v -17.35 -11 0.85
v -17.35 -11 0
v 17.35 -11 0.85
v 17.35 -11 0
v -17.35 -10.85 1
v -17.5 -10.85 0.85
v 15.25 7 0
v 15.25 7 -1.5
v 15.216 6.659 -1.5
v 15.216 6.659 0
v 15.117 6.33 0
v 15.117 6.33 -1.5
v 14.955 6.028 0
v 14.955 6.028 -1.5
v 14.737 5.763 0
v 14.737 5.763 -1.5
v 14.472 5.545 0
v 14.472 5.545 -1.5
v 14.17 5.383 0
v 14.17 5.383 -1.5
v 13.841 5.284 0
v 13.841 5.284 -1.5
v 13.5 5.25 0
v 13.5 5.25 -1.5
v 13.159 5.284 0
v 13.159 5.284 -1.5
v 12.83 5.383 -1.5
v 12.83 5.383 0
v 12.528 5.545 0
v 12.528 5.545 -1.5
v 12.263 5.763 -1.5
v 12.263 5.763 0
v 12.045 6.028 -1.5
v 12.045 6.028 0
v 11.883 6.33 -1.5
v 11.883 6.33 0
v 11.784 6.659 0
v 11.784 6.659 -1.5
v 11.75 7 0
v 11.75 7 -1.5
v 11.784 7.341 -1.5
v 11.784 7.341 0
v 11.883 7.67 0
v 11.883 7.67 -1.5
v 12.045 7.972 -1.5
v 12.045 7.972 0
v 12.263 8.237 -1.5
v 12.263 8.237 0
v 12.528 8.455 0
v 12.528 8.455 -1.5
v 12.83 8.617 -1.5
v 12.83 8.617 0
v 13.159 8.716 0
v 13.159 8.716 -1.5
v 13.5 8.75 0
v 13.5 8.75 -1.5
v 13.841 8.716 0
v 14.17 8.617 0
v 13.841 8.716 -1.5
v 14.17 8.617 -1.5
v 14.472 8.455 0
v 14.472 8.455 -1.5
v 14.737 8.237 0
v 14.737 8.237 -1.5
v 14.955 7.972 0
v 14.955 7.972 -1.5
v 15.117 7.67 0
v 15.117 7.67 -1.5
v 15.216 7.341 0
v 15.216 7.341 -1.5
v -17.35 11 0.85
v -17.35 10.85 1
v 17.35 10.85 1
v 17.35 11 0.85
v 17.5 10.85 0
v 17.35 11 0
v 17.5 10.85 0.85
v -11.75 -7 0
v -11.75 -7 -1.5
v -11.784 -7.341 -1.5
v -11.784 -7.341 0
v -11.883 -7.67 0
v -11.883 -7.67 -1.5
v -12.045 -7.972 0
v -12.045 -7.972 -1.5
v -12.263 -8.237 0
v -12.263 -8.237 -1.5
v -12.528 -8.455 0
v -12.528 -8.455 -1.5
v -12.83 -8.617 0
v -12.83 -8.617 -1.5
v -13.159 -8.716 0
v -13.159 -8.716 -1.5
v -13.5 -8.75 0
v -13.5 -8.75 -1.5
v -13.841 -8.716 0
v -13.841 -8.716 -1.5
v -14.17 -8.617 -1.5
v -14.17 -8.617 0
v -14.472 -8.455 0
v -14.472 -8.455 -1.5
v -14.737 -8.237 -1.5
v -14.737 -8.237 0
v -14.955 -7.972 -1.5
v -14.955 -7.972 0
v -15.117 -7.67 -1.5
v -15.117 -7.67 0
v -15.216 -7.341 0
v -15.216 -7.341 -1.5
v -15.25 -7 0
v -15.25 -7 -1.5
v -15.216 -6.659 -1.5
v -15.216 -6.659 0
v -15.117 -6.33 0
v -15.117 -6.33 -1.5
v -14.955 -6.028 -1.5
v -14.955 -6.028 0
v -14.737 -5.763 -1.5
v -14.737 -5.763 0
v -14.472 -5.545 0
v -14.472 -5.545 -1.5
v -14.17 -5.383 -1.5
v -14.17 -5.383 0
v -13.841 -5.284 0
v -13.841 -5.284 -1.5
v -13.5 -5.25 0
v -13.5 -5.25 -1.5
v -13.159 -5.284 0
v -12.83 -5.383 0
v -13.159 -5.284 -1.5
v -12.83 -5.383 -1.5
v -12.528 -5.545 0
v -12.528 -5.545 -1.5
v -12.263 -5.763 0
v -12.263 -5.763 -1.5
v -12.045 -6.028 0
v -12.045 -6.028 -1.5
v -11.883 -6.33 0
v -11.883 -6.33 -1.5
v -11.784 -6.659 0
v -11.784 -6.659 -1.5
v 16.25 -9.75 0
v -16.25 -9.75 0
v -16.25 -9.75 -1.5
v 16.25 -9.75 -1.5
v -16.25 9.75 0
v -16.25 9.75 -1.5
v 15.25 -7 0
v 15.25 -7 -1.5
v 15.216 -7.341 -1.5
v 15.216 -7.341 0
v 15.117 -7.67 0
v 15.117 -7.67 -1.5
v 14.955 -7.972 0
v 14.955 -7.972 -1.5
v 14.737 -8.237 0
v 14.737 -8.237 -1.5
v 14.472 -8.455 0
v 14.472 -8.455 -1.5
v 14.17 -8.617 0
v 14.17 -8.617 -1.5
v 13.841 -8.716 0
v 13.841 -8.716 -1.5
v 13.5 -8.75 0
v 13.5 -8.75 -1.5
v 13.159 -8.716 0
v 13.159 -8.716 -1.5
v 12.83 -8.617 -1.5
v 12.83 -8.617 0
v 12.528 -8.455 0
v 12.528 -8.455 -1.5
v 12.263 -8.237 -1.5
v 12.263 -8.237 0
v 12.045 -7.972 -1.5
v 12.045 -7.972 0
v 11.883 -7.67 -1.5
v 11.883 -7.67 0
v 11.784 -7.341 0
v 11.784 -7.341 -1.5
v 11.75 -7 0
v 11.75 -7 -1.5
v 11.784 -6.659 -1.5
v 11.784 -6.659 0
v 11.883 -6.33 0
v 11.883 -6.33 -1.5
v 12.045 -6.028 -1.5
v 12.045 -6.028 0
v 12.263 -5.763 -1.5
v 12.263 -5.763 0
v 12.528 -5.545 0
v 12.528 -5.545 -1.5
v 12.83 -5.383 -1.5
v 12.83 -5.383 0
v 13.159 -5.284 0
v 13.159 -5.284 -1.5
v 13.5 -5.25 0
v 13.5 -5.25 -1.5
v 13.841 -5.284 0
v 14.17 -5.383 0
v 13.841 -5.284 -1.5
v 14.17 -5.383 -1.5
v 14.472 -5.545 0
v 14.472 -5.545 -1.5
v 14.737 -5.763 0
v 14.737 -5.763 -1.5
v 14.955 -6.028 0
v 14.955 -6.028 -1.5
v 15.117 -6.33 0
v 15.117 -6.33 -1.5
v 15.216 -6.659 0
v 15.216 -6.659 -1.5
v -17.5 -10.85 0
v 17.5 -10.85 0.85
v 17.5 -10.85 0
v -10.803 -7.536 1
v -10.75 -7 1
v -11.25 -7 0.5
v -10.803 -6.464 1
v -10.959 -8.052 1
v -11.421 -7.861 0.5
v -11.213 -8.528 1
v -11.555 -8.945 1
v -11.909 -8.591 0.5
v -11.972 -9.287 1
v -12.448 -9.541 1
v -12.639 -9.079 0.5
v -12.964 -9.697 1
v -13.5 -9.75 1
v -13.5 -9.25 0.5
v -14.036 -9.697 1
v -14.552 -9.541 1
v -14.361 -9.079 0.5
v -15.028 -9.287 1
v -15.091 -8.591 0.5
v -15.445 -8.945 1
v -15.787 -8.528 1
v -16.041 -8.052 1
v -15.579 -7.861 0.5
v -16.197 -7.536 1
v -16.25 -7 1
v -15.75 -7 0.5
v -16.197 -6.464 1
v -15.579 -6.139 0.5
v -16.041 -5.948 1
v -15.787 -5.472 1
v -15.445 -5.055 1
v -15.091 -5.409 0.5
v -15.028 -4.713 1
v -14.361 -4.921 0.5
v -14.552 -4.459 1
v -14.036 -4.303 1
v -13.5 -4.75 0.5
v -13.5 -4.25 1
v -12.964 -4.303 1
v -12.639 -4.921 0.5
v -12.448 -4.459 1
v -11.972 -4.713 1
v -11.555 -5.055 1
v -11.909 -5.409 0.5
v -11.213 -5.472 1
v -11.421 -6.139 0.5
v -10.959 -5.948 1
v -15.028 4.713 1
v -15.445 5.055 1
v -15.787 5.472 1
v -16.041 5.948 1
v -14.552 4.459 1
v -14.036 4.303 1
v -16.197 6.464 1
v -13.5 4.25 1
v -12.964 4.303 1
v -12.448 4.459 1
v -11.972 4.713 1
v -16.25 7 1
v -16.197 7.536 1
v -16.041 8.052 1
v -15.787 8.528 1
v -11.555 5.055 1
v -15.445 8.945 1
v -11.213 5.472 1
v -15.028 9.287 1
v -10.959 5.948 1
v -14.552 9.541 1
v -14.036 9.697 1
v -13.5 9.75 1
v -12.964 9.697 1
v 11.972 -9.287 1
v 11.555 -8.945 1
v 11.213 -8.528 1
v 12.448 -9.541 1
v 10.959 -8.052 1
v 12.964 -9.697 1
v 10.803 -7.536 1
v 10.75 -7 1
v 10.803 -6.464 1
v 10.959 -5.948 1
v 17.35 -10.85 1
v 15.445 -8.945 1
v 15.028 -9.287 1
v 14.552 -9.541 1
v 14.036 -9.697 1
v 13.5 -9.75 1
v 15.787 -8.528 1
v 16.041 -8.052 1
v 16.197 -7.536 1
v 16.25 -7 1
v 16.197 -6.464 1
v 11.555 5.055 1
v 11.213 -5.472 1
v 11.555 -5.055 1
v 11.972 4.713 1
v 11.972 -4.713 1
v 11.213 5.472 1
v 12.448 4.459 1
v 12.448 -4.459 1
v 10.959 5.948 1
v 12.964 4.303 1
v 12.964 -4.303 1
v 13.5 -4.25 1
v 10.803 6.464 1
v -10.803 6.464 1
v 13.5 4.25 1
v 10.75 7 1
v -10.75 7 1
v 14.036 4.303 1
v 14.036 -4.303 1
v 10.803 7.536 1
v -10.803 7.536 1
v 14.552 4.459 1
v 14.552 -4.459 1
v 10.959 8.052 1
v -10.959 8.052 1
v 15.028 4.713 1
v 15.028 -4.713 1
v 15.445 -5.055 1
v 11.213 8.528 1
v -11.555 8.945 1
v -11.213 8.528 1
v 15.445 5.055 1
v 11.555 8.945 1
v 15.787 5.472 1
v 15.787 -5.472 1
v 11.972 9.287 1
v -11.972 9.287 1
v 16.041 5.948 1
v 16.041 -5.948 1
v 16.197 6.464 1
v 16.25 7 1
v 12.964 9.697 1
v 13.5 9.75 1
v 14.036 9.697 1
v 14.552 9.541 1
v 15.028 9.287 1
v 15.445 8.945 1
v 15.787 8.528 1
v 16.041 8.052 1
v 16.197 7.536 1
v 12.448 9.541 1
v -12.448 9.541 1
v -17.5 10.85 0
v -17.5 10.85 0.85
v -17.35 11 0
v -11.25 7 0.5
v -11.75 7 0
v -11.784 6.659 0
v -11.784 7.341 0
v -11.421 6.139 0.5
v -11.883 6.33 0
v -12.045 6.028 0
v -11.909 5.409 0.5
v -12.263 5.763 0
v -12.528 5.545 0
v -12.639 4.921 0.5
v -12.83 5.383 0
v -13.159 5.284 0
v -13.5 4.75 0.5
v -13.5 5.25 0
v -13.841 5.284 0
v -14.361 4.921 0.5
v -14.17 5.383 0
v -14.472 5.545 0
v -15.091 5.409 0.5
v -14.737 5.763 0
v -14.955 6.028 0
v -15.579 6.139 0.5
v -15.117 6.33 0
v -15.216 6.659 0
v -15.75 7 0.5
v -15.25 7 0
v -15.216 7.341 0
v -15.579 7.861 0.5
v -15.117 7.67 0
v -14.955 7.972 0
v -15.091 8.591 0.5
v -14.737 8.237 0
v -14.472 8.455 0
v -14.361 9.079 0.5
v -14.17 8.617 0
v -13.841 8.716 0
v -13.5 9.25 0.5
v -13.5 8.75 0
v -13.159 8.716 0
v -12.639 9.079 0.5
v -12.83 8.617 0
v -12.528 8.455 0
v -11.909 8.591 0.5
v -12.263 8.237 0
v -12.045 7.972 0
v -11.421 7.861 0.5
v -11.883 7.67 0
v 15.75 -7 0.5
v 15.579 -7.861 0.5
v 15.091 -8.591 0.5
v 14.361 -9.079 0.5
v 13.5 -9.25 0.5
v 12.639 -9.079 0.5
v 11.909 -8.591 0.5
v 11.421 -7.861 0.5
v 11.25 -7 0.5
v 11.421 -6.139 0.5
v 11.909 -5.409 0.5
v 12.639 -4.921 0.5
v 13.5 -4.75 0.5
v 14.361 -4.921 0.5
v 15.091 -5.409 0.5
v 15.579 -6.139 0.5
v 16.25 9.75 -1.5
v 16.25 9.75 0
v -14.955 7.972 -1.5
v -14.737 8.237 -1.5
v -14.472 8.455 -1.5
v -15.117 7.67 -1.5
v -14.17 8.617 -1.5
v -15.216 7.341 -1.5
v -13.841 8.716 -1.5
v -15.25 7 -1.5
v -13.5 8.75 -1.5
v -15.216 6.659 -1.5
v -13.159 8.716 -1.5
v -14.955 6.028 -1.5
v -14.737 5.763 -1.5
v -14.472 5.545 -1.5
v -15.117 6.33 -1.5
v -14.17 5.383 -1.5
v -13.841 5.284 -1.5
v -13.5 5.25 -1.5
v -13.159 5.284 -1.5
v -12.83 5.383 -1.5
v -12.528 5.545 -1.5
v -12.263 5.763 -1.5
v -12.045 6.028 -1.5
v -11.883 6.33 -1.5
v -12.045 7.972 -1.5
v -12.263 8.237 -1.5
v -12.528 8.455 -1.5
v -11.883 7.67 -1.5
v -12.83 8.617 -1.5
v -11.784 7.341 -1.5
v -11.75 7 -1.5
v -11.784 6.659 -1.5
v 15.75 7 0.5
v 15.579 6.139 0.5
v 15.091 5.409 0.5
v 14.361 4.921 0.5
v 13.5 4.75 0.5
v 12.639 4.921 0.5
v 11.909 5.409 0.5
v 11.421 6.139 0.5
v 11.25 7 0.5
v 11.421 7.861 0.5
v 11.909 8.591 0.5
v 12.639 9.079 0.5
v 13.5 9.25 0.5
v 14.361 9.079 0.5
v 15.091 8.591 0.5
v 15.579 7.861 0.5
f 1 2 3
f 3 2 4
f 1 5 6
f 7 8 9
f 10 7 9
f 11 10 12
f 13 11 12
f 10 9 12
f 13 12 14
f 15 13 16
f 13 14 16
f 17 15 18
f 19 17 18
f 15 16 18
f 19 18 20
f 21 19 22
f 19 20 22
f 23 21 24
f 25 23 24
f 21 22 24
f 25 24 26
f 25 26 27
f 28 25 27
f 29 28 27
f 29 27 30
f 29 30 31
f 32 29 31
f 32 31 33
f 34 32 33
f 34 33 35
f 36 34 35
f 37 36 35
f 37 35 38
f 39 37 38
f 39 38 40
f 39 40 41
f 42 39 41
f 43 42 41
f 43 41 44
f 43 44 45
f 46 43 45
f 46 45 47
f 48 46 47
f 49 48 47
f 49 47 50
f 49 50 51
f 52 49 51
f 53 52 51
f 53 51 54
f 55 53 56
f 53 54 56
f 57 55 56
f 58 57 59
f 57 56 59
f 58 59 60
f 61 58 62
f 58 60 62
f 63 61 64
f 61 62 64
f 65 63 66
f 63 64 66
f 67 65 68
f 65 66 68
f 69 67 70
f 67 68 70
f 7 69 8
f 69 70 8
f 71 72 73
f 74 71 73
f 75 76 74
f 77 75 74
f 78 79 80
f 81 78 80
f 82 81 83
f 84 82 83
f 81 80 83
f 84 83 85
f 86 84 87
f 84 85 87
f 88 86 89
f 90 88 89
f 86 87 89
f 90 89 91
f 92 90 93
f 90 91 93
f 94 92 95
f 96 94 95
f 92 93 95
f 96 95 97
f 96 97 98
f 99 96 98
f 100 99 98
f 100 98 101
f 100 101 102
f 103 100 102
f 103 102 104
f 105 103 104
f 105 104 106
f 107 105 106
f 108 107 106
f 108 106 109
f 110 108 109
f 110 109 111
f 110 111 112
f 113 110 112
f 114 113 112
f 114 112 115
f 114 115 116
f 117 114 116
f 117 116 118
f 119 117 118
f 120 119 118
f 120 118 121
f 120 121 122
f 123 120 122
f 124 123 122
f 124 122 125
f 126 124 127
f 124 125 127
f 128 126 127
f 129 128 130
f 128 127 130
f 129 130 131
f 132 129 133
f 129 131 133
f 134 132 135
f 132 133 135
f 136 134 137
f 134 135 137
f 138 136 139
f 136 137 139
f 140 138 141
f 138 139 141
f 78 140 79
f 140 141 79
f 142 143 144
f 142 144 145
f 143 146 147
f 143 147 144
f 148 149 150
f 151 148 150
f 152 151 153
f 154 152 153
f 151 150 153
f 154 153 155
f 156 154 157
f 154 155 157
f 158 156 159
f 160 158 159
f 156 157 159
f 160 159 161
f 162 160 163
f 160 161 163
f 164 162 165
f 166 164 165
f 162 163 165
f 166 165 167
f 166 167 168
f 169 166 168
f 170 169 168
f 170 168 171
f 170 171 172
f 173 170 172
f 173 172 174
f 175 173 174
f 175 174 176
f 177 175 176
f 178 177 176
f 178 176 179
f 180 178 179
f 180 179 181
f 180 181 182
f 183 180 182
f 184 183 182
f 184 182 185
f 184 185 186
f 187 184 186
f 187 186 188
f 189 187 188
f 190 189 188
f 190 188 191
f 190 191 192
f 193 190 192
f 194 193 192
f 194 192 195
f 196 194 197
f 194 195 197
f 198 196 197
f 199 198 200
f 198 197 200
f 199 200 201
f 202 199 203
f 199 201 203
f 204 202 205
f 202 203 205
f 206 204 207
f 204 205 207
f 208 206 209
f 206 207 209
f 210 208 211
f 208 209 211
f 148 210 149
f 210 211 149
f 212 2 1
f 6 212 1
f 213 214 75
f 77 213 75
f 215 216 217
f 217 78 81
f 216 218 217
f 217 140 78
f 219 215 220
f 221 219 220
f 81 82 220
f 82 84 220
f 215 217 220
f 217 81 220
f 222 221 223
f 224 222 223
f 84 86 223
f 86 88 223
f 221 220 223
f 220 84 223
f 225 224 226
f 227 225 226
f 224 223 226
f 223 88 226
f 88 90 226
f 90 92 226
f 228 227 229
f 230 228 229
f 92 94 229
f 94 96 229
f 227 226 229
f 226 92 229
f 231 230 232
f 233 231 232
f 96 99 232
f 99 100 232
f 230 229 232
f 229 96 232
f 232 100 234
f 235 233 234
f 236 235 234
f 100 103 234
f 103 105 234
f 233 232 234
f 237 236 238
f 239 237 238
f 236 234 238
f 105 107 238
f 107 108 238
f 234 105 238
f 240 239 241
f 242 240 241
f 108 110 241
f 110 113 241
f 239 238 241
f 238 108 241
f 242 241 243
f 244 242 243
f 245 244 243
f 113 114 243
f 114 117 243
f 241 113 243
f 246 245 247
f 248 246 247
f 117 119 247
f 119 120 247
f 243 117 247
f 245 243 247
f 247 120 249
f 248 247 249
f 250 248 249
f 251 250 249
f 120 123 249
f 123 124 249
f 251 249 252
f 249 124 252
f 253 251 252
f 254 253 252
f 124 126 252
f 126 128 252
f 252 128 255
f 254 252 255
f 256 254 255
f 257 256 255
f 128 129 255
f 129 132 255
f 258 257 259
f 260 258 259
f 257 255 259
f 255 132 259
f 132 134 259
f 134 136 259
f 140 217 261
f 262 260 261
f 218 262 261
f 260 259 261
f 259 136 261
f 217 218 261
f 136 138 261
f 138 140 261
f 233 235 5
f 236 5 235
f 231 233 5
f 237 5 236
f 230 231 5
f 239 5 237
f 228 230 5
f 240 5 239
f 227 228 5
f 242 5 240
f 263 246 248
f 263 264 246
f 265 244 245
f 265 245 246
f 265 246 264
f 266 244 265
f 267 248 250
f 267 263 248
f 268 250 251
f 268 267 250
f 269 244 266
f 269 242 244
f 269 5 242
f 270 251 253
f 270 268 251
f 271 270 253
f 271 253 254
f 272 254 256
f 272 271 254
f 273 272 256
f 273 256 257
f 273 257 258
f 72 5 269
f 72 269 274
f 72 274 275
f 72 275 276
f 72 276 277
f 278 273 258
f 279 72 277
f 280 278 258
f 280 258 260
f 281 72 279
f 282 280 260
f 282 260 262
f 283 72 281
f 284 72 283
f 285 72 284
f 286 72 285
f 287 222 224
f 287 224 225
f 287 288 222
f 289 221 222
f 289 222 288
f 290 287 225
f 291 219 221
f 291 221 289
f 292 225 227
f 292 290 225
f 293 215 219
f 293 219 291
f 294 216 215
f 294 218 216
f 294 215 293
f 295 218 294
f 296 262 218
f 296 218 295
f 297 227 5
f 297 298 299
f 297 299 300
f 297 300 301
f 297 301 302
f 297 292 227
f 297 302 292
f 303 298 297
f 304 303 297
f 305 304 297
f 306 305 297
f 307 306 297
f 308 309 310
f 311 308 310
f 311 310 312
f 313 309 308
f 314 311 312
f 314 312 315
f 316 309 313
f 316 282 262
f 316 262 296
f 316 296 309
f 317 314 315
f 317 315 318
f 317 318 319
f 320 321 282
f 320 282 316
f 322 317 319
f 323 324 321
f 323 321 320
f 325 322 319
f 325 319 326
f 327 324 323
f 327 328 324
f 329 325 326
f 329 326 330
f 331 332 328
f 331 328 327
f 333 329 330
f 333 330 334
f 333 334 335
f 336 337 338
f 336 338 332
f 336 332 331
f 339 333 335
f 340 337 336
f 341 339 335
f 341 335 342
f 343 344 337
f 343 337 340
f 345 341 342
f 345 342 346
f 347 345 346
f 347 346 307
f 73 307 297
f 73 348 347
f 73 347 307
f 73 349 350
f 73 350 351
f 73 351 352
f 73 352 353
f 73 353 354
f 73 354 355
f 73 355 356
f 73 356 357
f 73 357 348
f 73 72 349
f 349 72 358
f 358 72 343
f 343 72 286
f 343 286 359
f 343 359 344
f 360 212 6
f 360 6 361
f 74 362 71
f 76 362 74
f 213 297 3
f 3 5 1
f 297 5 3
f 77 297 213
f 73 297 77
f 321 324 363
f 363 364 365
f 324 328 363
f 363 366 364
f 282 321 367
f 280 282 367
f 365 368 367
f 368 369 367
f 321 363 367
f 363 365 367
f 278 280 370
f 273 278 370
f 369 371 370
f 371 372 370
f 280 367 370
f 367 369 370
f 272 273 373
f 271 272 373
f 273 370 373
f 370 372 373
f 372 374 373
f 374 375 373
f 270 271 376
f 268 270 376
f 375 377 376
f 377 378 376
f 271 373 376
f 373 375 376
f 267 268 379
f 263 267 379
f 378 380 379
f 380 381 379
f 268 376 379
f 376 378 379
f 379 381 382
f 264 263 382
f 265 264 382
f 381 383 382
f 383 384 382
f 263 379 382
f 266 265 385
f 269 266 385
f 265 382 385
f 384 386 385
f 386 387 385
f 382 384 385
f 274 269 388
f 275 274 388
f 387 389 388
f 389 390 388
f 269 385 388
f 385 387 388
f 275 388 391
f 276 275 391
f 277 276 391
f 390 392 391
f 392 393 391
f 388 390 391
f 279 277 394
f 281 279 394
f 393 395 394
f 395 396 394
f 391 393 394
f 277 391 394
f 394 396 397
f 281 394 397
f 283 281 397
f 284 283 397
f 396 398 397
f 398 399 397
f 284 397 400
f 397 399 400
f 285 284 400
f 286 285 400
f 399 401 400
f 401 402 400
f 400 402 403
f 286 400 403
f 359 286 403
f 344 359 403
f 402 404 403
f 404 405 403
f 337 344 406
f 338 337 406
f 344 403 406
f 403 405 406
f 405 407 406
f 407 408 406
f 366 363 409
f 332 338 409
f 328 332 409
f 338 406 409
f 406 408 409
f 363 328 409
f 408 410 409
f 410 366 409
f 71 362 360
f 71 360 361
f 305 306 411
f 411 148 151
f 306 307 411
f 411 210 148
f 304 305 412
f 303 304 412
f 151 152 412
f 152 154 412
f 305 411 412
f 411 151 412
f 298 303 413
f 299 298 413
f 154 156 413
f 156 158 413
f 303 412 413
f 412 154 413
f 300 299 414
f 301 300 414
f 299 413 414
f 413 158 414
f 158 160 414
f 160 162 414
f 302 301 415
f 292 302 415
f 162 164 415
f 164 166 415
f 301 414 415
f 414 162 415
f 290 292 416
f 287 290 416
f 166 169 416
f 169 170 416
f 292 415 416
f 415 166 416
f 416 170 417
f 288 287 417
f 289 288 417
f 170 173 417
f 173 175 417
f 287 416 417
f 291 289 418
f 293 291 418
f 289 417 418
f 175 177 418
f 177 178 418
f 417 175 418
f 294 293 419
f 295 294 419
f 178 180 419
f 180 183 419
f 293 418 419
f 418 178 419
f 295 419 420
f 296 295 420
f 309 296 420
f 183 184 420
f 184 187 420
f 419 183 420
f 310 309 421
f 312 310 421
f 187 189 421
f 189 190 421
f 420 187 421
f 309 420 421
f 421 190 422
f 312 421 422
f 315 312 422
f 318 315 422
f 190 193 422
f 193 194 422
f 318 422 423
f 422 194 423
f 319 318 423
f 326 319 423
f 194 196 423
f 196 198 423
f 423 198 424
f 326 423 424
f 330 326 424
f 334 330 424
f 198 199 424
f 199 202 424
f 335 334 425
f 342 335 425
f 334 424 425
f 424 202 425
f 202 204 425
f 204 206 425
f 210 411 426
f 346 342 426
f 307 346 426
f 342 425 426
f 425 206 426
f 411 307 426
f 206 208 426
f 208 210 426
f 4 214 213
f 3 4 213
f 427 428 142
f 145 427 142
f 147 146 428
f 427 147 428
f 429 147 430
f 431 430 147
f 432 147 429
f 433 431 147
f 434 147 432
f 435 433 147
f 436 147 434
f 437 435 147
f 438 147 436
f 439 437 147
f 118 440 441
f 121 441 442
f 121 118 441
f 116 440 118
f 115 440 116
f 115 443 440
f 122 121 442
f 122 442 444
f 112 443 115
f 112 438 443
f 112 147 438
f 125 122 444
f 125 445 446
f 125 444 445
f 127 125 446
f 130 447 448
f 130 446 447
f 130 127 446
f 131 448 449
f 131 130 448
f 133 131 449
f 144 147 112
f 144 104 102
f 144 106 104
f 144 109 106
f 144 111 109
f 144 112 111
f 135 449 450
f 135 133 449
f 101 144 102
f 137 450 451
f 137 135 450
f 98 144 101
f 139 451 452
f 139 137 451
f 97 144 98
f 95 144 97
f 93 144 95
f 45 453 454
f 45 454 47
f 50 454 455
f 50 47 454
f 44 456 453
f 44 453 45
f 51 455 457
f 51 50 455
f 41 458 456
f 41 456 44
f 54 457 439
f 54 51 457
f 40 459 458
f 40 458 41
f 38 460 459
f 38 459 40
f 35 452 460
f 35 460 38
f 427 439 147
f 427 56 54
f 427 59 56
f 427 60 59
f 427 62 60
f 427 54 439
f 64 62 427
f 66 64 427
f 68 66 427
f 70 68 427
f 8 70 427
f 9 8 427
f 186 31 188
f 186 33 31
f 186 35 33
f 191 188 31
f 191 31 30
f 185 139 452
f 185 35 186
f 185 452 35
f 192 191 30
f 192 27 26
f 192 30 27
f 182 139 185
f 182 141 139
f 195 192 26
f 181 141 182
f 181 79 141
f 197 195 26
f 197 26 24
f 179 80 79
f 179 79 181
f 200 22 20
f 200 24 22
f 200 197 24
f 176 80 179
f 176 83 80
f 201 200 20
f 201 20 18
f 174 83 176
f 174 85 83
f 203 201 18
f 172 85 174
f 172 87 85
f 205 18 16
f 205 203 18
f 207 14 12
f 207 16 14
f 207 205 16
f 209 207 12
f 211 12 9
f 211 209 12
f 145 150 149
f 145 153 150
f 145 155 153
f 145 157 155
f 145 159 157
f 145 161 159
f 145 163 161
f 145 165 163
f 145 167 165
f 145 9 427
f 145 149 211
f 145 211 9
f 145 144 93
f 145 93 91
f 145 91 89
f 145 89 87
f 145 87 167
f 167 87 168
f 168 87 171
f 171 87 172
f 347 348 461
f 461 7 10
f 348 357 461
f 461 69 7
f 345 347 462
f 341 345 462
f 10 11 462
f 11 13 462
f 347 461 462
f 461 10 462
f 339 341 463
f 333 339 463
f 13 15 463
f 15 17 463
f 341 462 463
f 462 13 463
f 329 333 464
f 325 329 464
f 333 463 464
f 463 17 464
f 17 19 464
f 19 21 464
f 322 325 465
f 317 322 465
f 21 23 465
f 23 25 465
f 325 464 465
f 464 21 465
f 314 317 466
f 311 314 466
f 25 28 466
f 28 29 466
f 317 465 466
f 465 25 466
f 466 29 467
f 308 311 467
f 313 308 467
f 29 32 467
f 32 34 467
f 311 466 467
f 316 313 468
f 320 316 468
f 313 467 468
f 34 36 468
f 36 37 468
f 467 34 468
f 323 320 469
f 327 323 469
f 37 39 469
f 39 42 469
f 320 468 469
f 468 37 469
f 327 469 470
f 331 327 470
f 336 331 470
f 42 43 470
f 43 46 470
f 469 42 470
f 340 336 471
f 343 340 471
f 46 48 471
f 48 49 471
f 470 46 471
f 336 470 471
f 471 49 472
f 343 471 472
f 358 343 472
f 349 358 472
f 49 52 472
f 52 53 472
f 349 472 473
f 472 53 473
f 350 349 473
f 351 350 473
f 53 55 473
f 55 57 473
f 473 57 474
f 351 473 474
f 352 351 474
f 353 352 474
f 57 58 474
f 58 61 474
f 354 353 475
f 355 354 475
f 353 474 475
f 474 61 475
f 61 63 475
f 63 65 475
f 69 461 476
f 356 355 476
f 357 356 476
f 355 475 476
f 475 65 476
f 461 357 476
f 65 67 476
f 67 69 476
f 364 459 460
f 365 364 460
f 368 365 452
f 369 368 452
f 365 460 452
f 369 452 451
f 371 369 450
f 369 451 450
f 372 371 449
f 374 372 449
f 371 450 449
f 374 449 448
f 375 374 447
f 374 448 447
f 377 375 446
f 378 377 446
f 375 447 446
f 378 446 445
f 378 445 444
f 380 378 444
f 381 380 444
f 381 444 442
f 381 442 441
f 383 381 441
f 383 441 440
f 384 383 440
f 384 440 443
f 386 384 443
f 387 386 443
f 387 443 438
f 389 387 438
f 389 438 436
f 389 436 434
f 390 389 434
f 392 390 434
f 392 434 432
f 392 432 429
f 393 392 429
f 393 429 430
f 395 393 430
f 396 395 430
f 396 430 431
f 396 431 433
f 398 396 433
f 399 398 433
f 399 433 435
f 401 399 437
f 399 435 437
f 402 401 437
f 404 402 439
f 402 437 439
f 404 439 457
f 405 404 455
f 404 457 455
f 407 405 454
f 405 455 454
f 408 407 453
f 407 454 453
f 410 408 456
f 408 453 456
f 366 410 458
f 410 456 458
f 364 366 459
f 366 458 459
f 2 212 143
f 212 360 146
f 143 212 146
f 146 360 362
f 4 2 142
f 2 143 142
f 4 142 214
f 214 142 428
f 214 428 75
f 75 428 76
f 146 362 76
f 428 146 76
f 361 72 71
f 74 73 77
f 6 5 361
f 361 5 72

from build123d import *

# Parameters (mm, degrees)
F0_W     = 35
F0_H     = 22
F1_DEPTH = 1
F2_SIZE  = 0.15
F3_W     = 32.5
F3_H     = 19.5
F4_DEPTH = 1.5
F5_R     = 1.75
F6_DEPTH = 25
F7_SIZE  = 1


with BuildPart() as f1:
    # F0 (on Top) → F1 (new body)
    with BuildSketch(Plane.XY):
        Rectangle(F0_W, F0_H)
    extrude(amount=F1_DEPTH)

    # F2
    f2_edges = [f1.edges().sort_by_distance(p)[0] for p in [
        (-17.5, 0, 1),
        (0, 11, 1),
        (17.5, 0, 1),
        (0, -11, 1),
        (-17.5, 11, 0.5),
        (17.5, 11, 0.5),
        (17.5, -11, 0.5),
        (-17.5, -11, 0.5),
    ]]
    chamfer(f2_edges, length=F2_SIZE)

    # F3 (on face) → F4 (join)
    with BuildSketch(Plane(origin=(0, 0, 0), x_dir=(1, 0, 0), z_dir=(0, 0, -1))):
        Rectangle(F3_W, F3_H)
    extrude(amount=F4_DEPTH)

    # F5 (on face) → F6 (cut)
    with BuildSketch(Plane(origin=(0, 0, -1.5), x_dir=(1, 0, 0), z_dir=(0, 0, -1))):
        with Locations((-13.5, 7)):
            Circle(F5_R)
        with Locations((-13.5, -7)):
            Circle(F5_R)
        with Locations((13.5, -7)):
            Circle(F5_R)
        with Locations((13.5, 7)):
            Circle(F5_R)
    extrude(amount=-F6_DEPTH, mode=Mode.SUBTRACT)

    # F7
    f7_edges = [f1.edges().sort_by_distance(p)[0] for p in [
        (-15.25, 7, 1),
        (11.75, 7, 1),
        (11.75, -7, 1),
        (-15.25, -7, 1),
    ]]
    chamfer(f7_edges, length=F7_SIZE)


solid = f1.part
